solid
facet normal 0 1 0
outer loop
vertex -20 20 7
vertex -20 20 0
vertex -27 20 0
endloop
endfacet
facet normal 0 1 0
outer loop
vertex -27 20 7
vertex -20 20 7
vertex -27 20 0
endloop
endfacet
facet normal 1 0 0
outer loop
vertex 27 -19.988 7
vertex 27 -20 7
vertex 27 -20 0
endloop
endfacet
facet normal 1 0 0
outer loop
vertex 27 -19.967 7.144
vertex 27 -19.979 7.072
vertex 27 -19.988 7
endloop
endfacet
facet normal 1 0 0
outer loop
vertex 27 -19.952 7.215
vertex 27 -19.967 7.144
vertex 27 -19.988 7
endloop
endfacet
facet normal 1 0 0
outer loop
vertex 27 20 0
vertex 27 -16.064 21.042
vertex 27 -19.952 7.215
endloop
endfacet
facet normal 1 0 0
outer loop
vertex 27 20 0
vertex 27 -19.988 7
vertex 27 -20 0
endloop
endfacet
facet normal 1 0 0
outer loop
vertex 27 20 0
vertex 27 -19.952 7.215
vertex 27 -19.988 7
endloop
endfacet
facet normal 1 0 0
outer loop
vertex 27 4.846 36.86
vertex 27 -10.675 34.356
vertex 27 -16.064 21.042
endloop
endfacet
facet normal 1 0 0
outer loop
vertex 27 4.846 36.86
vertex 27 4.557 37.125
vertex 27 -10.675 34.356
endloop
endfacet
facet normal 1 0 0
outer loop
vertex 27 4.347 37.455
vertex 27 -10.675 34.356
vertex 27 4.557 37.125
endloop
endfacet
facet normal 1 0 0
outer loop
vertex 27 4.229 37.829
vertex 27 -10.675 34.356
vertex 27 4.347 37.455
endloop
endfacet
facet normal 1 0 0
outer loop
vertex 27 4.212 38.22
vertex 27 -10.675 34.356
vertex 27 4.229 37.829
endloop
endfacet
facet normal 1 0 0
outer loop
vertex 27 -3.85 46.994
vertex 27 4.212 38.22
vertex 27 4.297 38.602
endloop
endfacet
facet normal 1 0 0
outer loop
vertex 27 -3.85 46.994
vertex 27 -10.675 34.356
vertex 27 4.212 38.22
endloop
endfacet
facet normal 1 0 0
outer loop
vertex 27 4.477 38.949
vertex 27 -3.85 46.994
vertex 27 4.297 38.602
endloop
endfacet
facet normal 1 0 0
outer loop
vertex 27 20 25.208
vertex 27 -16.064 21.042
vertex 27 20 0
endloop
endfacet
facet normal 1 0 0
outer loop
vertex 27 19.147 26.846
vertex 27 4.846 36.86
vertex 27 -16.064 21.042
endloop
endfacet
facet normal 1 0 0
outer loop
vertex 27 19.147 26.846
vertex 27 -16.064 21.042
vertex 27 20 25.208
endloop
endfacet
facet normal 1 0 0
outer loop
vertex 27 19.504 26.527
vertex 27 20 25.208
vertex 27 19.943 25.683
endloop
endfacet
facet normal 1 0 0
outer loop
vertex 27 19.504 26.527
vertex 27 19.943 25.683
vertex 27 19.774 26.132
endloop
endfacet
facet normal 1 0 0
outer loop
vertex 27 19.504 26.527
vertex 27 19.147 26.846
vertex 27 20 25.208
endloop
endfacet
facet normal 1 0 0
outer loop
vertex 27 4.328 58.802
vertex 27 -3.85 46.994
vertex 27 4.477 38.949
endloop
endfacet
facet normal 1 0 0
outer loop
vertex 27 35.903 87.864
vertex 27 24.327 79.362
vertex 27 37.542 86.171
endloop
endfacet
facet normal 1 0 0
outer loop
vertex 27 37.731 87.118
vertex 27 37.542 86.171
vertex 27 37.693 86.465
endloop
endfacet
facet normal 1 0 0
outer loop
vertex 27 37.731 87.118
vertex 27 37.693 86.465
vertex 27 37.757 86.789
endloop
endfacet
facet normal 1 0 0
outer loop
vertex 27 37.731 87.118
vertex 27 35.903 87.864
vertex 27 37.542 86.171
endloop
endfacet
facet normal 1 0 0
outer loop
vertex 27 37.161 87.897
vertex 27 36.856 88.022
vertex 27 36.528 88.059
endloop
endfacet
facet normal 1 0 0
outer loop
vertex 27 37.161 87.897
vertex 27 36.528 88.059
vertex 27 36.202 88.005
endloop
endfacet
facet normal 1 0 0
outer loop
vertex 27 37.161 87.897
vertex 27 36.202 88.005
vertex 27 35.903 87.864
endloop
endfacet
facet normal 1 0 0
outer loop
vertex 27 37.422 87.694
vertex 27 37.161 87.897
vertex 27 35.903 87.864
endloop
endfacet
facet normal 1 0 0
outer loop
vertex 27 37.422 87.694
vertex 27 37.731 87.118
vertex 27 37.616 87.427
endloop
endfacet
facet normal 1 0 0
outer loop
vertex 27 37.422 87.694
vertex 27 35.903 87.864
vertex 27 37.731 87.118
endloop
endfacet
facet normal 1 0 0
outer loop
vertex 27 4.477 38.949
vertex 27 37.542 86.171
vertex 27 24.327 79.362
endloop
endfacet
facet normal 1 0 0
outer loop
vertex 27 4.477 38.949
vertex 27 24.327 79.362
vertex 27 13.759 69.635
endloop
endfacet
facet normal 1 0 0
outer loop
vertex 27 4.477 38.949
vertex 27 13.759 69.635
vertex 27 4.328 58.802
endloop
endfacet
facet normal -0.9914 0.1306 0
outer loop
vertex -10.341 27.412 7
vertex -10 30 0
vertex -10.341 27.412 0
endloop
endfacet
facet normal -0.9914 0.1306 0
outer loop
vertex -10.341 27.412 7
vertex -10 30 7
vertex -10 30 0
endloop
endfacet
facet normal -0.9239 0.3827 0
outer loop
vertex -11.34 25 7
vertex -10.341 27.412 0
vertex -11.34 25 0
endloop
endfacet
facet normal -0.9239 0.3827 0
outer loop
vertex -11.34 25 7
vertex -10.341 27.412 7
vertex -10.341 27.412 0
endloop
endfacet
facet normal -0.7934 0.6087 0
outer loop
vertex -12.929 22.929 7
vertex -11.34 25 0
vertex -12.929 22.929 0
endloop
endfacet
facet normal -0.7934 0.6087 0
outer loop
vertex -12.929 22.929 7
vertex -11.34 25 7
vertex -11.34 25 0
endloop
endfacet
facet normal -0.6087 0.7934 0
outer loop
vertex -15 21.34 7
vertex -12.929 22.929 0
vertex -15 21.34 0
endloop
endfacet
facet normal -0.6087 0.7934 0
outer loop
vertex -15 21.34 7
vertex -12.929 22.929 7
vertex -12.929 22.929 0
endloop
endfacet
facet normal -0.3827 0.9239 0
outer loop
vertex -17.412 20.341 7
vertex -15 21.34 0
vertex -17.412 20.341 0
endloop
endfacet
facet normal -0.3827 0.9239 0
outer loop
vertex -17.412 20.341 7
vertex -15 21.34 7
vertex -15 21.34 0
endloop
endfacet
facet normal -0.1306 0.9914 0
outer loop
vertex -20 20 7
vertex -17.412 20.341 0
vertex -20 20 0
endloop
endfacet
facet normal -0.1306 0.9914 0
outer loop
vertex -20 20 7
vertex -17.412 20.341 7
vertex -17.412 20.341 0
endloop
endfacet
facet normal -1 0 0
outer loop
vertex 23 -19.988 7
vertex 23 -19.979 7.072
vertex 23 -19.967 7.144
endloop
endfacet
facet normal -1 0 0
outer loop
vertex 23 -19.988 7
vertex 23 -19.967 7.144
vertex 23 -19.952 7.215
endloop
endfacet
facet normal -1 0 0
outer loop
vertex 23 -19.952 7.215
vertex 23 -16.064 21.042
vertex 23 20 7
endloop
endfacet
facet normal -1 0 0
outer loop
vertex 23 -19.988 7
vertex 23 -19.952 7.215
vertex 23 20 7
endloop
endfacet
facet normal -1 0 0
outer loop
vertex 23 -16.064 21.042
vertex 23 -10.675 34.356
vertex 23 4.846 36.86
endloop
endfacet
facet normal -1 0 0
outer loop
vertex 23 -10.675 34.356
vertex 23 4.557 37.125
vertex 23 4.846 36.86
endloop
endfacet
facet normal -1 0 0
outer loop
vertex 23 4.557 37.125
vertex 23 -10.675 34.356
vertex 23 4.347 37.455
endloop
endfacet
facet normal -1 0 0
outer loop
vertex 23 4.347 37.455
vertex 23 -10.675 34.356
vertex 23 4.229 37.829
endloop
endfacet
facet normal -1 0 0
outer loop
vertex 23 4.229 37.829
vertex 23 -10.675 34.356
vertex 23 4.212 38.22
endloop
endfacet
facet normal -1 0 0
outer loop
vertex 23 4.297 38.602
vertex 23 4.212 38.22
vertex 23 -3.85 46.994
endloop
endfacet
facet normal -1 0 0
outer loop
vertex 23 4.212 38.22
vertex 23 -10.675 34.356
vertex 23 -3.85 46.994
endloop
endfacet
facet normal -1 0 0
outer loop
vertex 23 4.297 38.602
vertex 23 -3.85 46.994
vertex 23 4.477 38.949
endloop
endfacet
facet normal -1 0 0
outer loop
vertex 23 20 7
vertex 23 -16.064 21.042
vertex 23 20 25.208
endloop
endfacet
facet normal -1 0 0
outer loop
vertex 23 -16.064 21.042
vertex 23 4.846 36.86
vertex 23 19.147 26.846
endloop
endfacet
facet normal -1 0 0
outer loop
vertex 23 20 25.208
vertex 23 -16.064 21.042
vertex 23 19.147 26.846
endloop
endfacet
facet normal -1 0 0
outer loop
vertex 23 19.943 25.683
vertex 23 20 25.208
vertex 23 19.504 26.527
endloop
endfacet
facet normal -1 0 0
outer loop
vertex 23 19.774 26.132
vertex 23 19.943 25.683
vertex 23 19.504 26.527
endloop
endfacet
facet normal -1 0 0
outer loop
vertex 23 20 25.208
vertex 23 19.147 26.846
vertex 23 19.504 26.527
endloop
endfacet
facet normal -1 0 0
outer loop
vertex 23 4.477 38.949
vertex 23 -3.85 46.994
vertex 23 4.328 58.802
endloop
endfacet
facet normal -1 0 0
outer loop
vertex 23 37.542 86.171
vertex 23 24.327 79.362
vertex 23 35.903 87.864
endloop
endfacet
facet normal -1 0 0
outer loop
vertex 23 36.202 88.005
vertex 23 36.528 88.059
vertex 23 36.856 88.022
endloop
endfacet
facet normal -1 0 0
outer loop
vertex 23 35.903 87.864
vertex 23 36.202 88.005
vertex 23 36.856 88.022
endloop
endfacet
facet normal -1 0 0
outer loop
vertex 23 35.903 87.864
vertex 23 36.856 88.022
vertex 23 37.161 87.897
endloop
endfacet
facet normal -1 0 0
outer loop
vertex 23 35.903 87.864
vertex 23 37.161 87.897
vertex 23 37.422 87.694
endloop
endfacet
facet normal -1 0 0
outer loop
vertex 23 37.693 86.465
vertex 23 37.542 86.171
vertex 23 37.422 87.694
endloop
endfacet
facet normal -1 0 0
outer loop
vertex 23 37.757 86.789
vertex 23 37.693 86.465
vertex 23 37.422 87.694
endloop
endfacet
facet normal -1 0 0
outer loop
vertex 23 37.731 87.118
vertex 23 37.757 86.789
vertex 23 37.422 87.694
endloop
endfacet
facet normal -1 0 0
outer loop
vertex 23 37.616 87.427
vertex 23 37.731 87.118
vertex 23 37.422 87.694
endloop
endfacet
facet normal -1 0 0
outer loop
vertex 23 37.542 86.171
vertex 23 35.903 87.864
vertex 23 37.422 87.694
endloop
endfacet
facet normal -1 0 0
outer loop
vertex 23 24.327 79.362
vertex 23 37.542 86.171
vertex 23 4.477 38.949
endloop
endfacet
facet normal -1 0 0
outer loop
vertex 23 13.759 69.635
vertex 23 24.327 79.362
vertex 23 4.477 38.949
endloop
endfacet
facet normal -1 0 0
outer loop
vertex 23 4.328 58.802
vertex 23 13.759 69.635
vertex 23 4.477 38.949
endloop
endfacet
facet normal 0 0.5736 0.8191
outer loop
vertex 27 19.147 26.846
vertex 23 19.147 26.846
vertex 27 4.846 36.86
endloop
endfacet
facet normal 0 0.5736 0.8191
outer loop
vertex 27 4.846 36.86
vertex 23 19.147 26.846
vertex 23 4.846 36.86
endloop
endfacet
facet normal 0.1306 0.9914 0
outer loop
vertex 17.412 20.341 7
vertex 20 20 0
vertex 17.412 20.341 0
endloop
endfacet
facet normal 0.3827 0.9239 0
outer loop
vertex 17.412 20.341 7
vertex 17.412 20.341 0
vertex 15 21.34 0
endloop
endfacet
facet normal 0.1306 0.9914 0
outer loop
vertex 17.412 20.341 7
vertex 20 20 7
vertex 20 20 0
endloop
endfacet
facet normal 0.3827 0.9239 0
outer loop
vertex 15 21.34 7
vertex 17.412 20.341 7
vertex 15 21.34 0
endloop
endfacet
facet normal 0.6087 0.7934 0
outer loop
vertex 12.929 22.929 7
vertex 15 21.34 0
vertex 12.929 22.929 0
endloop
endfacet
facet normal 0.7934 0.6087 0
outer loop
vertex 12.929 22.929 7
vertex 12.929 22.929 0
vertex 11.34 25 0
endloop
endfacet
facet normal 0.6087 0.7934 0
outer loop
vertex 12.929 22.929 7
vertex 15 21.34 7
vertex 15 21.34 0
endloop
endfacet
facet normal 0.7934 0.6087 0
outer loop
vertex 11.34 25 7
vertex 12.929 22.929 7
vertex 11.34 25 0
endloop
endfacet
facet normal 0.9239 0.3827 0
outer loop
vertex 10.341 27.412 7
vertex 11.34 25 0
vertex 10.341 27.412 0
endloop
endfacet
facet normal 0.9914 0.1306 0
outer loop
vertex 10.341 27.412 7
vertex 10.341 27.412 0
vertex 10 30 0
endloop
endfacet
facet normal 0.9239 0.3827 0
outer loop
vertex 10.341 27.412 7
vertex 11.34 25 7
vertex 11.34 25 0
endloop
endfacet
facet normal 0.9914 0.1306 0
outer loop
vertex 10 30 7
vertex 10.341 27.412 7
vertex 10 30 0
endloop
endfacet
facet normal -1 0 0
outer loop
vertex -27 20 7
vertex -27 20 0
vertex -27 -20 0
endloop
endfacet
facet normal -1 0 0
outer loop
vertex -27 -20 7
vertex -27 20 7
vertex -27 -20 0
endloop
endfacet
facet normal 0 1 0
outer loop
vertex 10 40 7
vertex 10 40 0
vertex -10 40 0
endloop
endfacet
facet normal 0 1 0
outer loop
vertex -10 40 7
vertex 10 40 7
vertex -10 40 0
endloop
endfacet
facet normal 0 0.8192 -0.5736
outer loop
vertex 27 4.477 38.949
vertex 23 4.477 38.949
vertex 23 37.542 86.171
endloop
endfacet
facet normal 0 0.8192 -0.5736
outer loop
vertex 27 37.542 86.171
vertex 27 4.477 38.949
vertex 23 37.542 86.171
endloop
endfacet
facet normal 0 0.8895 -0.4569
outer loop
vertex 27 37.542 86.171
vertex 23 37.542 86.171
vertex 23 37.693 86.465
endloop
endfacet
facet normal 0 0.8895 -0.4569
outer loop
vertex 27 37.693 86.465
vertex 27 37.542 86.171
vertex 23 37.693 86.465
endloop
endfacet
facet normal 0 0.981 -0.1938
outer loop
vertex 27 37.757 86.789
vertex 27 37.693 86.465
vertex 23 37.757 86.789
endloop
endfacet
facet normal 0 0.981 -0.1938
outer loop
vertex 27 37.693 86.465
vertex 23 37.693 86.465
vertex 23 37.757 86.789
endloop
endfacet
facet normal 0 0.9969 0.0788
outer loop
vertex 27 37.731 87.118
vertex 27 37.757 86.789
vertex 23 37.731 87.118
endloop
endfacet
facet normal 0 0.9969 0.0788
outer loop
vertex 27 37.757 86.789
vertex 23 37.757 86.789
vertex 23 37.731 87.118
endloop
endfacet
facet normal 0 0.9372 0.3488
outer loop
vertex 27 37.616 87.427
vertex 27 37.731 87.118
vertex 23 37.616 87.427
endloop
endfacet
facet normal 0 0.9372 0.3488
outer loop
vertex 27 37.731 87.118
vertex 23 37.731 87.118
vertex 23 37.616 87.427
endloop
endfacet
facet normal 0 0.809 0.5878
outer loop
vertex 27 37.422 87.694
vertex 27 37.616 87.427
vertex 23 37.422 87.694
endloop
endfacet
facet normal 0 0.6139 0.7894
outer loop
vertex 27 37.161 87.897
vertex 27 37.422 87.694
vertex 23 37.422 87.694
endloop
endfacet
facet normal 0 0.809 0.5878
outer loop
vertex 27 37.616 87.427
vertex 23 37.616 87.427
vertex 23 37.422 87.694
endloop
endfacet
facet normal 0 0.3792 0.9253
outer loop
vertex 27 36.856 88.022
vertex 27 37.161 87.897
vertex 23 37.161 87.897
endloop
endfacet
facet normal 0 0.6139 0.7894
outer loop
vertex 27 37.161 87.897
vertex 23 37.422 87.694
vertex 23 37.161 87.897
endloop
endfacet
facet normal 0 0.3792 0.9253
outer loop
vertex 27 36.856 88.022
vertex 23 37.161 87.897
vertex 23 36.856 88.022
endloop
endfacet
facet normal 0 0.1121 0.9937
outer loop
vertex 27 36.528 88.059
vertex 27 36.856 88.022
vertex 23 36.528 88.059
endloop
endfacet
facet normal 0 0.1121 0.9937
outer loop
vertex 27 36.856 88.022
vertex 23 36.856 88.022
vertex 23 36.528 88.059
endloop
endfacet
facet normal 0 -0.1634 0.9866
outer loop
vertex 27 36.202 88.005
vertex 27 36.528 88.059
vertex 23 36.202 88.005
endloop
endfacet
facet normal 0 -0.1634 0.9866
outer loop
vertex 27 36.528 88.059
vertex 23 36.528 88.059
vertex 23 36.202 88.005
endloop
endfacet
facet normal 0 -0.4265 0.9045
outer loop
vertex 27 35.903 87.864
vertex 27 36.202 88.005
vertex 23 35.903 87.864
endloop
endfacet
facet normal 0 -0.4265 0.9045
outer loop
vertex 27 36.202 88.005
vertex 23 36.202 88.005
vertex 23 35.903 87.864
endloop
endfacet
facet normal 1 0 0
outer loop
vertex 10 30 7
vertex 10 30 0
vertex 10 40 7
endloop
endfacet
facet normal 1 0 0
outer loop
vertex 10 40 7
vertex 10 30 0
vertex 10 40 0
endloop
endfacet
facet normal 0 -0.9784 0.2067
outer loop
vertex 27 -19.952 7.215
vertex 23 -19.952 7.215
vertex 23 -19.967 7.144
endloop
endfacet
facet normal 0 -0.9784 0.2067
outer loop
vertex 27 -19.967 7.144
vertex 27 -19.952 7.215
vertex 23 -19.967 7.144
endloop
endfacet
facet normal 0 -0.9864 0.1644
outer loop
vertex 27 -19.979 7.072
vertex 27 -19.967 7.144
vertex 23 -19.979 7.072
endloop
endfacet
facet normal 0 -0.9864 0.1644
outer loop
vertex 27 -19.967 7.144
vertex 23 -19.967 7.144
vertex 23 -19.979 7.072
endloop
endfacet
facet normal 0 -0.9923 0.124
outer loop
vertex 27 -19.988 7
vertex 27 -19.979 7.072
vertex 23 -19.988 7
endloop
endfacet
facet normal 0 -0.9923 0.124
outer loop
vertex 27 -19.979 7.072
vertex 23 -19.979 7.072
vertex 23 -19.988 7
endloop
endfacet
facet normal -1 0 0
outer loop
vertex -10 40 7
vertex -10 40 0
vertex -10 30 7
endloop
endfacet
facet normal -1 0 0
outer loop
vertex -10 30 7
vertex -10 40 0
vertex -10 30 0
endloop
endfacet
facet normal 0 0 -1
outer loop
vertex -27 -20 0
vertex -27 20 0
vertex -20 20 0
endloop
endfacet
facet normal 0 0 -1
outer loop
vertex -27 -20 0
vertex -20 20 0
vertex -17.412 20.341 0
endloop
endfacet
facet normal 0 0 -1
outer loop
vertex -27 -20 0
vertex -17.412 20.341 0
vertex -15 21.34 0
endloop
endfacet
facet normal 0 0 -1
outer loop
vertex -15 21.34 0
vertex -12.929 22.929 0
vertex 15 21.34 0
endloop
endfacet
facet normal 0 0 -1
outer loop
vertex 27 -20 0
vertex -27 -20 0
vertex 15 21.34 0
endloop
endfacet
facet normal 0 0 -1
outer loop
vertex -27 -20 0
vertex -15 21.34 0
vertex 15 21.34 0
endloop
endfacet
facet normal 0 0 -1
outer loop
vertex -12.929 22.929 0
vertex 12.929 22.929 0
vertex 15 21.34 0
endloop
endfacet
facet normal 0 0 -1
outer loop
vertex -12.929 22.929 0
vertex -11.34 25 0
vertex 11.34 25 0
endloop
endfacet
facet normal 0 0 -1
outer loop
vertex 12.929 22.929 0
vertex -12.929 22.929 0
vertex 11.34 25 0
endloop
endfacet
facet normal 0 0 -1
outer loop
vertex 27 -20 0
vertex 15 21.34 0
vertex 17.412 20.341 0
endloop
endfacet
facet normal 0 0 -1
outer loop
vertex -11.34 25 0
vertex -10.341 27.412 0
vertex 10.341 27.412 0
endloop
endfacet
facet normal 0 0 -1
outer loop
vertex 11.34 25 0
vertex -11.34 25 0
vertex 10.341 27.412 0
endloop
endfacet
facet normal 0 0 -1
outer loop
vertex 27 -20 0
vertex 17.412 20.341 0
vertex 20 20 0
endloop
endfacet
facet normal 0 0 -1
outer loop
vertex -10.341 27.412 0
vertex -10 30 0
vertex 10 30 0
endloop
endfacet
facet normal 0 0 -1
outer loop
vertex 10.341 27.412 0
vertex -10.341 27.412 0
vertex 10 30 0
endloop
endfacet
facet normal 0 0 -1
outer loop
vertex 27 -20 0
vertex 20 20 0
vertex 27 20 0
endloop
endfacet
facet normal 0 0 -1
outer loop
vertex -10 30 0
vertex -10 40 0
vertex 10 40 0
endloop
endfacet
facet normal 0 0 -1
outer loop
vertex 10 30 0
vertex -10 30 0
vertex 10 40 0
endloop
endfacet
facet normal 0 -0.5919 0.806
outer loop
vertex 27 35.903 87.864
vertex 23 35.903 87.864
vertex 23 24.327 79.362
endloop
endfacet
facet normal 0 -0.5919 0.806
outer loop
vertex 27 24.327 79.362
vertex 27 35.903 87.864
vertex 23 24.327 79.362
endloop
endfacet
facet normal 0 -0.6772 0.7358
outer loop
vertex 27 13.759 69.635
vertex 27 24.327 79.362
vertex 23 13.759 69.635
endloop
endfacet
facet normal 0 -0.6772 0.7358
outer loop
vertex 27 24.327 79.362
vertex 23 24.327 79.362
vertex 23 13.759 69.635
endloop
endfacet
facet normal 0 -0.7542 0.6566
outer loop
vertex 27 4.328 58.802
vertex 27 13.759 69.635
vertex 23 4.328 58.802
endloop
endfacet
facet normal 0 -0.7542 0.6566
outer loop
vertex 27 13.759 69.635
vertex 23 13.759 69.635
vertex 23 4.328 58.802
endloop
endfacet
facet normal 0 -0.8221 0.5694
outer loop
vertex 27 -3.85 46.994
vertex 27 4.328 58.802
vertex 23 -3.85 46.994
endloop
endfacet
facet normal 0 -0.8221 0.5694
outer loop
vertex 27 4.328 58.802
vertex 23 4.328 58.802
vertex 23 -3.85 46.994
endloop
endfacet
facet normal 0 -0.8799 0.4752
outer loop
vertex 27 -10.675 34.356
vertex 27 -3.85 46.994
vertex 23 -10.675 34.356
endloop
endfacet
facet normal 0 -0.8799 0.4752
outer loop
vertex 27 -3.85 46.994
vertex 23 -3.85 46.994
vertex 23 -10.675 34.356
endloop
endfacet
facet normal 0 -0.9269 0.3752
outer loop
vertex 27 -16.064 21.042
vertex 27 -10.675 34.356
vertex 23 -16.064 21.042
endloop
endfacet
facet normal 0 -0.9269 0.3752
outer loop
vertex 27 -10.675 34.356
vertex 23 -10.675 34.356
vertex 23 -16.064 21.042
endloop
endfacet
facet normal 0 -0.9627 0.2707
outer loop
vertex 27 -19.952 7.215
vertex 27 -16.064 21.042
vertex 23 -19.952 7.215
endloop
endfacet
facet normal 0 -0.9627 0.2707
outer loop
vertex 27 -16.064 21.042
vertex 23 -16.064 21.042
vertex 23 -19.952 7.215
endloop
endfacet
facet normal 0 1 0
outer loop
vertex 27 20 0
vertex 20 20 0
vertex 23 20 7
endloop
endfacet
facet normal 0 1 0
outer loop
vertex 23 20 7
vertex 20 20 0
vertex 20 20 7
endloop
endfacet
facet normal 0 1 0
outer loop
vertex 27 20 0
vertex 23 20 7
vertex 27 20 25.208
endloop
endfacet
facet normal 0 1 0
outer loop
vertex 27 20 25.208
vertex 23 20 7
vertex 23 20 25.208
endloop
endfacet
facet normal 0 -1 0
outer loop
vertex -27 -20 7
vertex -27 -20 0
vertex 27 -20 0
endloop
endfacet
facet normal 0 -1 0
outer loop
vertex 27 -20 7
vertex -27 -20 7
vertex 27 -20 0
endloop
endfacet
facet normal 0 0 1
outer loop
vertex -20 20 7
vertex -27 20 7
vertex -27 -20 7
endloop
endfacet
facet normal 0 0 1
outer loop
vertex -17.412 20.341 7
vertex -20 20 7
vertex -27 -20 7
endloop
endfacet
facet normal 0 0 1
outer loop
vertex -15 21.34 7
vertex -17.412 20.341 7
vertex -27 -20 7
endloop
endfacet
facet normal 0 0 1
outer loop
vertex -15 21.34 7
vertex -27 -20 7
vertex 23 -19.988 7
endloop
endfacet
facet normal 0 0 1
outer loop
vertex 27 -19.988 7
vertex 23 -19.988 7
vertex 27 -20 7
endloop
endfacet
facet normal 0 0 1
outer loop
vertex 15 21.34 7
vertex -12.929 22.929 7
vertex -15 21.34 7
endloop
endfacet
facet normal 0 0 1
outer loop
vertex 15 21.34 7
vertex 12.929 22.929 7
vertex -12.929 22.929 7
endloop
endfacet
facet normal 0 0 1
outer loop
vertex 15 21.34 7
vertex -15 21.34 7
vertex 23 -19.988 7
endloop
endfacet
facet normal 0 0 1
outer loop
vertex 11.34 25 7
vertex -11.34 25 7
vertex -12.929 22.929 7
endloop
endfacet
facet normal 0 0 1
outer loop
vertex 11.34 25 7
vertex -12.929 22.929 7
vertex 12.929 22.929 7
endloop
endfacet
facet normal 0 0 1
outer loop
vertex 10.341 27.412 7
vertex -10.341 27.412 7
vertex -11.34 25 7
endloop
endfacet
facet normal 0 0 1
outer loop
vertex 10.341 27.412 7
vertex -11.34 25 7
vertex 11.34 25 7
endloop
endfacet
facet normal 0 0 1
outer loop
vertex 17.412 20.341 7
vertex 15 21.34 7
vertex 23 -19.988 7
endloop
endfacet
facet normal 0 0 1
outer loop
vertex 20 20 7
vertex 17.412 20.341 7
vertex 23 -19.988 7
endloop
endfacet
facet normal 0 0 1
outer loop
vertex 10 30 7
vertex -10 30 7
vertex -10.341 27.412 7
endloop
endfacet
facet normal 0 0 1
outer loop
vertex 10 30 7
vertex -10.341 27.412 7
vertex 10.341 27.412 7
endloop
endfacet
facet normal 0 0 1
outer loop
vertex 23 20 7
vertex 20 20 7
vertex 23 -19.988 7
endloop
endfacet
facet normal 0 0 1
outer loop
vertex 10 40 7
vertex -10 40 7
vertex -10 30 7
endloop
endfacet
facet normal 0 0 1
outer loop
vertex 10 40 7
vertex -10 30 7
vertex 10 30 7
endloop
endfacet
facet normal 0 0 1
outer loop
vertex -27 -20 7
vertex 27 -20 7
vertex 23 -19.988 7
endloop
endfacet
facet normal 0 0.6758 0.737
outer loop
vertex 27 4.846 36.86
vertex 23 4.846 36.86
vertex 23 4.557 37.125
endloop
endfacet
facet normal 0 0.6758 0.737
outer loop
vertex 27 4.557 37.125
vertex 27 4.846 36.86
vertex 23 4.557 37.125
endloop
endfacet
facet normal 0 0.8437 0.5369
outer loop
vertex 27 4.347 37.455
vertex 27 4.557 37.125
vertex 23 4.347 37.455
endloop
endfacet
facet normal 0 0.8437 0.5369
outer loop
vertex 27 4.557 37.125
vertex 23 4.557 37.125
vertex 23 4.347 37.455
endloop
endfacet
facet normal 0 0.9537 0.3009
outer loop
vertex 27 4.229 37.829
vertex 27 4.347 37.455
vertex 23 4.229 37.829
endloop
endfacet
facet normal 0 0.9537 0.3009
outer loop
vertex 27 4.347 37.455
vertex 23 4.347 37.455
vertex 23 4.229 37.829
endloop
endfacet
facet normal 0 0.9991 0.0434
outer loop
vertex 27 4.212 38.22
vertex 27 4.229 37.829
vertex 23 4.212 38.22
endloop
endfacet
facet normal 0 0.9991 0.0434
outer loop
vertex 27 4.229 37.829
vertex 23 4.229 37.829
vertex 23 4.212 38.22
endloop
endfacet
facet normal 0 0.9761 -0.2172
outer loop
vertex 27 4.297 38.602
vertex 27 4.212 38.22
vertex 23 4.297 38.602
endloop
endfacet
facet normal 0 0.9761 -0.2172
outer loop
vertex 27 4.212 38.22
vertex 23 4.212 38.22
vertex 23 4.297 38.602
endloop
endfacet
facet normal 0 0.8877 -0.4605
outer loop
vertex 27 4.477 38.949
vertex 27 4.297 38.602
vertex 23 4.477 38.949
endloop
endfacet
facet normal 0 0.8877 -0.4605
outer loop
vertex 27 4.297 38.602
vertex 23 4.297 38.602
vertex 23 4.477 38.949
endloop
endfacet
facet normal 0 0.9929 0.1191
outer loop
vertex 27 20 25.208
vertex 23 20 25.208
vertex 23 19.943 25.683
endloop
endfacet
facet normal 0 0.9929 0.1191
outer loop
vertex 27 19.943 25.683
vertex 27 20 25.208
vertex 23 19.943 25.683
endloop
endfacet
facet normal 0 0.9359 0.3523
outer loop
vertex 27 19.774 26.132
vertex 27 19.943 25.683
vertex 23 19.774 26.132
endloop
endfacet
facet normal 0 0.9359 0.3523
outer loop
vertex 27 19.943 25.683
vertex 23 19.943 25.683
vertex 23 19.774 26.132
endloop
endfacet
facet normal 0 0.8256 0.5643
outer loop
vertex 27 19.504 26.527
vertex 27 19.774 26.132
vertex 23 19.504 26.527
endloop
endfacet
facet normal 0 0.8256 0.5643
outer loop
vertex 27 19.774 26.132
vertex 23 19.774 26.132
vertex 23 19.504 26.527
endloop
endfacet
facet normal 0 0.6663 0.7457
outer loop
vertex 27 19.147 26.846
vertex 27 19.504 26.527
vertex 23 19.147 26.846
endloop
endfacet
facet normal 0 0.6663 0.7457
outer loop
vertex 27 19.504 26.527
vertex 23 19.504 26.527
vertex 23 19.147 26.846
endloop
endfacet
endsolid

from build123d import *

# Parameters (mm, degrees)
F1_DEPTH = 7
F2_R     = 10
F5_DEPTH = 4


with BuildPart() as f1:
    # F0 (on Top) → F1 (new body)
    with BuildSketch(Plane.XY):
        Polygon((-27, -20), (27, -20), (27, 20), (10, 20), (10, 40), (-10, 40), (-10, 20), (-27, 20), align=None)
    extrude(amount=F1_DEPTH)

    # F2
    f2_edges = [f1.edges().sort_by_distance(p)[0] for p in [
        (10, 20, 3.5),
        (-10, 20, 3.5),
    ]]
    fillet(f2_edges, radius=F2_R)

    # F4 (on offset) → F5 (join)
    with BuildSketch(Plane.YZ.offset(23)):
        with BuildLine():
            Line((-19.987991, 7), (20, 7))
            Line((20, 7), (20, 25.208094))
            ThreePointArc((20, 25.208094), (19.774022, 26.131591), (19.147153, 26.846398))
            Line((19.147153, 26.846398), (4.845687, 36.860392))
            ThreePointArc((4.845687, 36.860392), (4.22884, 37.828648), (4.477324, 38.949485))
            Line((4.477324, 38.949485), (37.542201, 86.171024))
            ThreePointArc((37.542201, 86.171024), (37.421504, 87.69386), (35.903428, 87.864272))
            ThreePointArc((35.903428, 87.864272), (0.076045, 53.010837), (-19.952304, 7.215329))
            ThreePointArc((-19.952304, 7.215329), (-19.973087, 7.108152), (-19.987991, 7))
        make_face()
    extrude(amount=F5_DEPTH)


solid = f1.part
